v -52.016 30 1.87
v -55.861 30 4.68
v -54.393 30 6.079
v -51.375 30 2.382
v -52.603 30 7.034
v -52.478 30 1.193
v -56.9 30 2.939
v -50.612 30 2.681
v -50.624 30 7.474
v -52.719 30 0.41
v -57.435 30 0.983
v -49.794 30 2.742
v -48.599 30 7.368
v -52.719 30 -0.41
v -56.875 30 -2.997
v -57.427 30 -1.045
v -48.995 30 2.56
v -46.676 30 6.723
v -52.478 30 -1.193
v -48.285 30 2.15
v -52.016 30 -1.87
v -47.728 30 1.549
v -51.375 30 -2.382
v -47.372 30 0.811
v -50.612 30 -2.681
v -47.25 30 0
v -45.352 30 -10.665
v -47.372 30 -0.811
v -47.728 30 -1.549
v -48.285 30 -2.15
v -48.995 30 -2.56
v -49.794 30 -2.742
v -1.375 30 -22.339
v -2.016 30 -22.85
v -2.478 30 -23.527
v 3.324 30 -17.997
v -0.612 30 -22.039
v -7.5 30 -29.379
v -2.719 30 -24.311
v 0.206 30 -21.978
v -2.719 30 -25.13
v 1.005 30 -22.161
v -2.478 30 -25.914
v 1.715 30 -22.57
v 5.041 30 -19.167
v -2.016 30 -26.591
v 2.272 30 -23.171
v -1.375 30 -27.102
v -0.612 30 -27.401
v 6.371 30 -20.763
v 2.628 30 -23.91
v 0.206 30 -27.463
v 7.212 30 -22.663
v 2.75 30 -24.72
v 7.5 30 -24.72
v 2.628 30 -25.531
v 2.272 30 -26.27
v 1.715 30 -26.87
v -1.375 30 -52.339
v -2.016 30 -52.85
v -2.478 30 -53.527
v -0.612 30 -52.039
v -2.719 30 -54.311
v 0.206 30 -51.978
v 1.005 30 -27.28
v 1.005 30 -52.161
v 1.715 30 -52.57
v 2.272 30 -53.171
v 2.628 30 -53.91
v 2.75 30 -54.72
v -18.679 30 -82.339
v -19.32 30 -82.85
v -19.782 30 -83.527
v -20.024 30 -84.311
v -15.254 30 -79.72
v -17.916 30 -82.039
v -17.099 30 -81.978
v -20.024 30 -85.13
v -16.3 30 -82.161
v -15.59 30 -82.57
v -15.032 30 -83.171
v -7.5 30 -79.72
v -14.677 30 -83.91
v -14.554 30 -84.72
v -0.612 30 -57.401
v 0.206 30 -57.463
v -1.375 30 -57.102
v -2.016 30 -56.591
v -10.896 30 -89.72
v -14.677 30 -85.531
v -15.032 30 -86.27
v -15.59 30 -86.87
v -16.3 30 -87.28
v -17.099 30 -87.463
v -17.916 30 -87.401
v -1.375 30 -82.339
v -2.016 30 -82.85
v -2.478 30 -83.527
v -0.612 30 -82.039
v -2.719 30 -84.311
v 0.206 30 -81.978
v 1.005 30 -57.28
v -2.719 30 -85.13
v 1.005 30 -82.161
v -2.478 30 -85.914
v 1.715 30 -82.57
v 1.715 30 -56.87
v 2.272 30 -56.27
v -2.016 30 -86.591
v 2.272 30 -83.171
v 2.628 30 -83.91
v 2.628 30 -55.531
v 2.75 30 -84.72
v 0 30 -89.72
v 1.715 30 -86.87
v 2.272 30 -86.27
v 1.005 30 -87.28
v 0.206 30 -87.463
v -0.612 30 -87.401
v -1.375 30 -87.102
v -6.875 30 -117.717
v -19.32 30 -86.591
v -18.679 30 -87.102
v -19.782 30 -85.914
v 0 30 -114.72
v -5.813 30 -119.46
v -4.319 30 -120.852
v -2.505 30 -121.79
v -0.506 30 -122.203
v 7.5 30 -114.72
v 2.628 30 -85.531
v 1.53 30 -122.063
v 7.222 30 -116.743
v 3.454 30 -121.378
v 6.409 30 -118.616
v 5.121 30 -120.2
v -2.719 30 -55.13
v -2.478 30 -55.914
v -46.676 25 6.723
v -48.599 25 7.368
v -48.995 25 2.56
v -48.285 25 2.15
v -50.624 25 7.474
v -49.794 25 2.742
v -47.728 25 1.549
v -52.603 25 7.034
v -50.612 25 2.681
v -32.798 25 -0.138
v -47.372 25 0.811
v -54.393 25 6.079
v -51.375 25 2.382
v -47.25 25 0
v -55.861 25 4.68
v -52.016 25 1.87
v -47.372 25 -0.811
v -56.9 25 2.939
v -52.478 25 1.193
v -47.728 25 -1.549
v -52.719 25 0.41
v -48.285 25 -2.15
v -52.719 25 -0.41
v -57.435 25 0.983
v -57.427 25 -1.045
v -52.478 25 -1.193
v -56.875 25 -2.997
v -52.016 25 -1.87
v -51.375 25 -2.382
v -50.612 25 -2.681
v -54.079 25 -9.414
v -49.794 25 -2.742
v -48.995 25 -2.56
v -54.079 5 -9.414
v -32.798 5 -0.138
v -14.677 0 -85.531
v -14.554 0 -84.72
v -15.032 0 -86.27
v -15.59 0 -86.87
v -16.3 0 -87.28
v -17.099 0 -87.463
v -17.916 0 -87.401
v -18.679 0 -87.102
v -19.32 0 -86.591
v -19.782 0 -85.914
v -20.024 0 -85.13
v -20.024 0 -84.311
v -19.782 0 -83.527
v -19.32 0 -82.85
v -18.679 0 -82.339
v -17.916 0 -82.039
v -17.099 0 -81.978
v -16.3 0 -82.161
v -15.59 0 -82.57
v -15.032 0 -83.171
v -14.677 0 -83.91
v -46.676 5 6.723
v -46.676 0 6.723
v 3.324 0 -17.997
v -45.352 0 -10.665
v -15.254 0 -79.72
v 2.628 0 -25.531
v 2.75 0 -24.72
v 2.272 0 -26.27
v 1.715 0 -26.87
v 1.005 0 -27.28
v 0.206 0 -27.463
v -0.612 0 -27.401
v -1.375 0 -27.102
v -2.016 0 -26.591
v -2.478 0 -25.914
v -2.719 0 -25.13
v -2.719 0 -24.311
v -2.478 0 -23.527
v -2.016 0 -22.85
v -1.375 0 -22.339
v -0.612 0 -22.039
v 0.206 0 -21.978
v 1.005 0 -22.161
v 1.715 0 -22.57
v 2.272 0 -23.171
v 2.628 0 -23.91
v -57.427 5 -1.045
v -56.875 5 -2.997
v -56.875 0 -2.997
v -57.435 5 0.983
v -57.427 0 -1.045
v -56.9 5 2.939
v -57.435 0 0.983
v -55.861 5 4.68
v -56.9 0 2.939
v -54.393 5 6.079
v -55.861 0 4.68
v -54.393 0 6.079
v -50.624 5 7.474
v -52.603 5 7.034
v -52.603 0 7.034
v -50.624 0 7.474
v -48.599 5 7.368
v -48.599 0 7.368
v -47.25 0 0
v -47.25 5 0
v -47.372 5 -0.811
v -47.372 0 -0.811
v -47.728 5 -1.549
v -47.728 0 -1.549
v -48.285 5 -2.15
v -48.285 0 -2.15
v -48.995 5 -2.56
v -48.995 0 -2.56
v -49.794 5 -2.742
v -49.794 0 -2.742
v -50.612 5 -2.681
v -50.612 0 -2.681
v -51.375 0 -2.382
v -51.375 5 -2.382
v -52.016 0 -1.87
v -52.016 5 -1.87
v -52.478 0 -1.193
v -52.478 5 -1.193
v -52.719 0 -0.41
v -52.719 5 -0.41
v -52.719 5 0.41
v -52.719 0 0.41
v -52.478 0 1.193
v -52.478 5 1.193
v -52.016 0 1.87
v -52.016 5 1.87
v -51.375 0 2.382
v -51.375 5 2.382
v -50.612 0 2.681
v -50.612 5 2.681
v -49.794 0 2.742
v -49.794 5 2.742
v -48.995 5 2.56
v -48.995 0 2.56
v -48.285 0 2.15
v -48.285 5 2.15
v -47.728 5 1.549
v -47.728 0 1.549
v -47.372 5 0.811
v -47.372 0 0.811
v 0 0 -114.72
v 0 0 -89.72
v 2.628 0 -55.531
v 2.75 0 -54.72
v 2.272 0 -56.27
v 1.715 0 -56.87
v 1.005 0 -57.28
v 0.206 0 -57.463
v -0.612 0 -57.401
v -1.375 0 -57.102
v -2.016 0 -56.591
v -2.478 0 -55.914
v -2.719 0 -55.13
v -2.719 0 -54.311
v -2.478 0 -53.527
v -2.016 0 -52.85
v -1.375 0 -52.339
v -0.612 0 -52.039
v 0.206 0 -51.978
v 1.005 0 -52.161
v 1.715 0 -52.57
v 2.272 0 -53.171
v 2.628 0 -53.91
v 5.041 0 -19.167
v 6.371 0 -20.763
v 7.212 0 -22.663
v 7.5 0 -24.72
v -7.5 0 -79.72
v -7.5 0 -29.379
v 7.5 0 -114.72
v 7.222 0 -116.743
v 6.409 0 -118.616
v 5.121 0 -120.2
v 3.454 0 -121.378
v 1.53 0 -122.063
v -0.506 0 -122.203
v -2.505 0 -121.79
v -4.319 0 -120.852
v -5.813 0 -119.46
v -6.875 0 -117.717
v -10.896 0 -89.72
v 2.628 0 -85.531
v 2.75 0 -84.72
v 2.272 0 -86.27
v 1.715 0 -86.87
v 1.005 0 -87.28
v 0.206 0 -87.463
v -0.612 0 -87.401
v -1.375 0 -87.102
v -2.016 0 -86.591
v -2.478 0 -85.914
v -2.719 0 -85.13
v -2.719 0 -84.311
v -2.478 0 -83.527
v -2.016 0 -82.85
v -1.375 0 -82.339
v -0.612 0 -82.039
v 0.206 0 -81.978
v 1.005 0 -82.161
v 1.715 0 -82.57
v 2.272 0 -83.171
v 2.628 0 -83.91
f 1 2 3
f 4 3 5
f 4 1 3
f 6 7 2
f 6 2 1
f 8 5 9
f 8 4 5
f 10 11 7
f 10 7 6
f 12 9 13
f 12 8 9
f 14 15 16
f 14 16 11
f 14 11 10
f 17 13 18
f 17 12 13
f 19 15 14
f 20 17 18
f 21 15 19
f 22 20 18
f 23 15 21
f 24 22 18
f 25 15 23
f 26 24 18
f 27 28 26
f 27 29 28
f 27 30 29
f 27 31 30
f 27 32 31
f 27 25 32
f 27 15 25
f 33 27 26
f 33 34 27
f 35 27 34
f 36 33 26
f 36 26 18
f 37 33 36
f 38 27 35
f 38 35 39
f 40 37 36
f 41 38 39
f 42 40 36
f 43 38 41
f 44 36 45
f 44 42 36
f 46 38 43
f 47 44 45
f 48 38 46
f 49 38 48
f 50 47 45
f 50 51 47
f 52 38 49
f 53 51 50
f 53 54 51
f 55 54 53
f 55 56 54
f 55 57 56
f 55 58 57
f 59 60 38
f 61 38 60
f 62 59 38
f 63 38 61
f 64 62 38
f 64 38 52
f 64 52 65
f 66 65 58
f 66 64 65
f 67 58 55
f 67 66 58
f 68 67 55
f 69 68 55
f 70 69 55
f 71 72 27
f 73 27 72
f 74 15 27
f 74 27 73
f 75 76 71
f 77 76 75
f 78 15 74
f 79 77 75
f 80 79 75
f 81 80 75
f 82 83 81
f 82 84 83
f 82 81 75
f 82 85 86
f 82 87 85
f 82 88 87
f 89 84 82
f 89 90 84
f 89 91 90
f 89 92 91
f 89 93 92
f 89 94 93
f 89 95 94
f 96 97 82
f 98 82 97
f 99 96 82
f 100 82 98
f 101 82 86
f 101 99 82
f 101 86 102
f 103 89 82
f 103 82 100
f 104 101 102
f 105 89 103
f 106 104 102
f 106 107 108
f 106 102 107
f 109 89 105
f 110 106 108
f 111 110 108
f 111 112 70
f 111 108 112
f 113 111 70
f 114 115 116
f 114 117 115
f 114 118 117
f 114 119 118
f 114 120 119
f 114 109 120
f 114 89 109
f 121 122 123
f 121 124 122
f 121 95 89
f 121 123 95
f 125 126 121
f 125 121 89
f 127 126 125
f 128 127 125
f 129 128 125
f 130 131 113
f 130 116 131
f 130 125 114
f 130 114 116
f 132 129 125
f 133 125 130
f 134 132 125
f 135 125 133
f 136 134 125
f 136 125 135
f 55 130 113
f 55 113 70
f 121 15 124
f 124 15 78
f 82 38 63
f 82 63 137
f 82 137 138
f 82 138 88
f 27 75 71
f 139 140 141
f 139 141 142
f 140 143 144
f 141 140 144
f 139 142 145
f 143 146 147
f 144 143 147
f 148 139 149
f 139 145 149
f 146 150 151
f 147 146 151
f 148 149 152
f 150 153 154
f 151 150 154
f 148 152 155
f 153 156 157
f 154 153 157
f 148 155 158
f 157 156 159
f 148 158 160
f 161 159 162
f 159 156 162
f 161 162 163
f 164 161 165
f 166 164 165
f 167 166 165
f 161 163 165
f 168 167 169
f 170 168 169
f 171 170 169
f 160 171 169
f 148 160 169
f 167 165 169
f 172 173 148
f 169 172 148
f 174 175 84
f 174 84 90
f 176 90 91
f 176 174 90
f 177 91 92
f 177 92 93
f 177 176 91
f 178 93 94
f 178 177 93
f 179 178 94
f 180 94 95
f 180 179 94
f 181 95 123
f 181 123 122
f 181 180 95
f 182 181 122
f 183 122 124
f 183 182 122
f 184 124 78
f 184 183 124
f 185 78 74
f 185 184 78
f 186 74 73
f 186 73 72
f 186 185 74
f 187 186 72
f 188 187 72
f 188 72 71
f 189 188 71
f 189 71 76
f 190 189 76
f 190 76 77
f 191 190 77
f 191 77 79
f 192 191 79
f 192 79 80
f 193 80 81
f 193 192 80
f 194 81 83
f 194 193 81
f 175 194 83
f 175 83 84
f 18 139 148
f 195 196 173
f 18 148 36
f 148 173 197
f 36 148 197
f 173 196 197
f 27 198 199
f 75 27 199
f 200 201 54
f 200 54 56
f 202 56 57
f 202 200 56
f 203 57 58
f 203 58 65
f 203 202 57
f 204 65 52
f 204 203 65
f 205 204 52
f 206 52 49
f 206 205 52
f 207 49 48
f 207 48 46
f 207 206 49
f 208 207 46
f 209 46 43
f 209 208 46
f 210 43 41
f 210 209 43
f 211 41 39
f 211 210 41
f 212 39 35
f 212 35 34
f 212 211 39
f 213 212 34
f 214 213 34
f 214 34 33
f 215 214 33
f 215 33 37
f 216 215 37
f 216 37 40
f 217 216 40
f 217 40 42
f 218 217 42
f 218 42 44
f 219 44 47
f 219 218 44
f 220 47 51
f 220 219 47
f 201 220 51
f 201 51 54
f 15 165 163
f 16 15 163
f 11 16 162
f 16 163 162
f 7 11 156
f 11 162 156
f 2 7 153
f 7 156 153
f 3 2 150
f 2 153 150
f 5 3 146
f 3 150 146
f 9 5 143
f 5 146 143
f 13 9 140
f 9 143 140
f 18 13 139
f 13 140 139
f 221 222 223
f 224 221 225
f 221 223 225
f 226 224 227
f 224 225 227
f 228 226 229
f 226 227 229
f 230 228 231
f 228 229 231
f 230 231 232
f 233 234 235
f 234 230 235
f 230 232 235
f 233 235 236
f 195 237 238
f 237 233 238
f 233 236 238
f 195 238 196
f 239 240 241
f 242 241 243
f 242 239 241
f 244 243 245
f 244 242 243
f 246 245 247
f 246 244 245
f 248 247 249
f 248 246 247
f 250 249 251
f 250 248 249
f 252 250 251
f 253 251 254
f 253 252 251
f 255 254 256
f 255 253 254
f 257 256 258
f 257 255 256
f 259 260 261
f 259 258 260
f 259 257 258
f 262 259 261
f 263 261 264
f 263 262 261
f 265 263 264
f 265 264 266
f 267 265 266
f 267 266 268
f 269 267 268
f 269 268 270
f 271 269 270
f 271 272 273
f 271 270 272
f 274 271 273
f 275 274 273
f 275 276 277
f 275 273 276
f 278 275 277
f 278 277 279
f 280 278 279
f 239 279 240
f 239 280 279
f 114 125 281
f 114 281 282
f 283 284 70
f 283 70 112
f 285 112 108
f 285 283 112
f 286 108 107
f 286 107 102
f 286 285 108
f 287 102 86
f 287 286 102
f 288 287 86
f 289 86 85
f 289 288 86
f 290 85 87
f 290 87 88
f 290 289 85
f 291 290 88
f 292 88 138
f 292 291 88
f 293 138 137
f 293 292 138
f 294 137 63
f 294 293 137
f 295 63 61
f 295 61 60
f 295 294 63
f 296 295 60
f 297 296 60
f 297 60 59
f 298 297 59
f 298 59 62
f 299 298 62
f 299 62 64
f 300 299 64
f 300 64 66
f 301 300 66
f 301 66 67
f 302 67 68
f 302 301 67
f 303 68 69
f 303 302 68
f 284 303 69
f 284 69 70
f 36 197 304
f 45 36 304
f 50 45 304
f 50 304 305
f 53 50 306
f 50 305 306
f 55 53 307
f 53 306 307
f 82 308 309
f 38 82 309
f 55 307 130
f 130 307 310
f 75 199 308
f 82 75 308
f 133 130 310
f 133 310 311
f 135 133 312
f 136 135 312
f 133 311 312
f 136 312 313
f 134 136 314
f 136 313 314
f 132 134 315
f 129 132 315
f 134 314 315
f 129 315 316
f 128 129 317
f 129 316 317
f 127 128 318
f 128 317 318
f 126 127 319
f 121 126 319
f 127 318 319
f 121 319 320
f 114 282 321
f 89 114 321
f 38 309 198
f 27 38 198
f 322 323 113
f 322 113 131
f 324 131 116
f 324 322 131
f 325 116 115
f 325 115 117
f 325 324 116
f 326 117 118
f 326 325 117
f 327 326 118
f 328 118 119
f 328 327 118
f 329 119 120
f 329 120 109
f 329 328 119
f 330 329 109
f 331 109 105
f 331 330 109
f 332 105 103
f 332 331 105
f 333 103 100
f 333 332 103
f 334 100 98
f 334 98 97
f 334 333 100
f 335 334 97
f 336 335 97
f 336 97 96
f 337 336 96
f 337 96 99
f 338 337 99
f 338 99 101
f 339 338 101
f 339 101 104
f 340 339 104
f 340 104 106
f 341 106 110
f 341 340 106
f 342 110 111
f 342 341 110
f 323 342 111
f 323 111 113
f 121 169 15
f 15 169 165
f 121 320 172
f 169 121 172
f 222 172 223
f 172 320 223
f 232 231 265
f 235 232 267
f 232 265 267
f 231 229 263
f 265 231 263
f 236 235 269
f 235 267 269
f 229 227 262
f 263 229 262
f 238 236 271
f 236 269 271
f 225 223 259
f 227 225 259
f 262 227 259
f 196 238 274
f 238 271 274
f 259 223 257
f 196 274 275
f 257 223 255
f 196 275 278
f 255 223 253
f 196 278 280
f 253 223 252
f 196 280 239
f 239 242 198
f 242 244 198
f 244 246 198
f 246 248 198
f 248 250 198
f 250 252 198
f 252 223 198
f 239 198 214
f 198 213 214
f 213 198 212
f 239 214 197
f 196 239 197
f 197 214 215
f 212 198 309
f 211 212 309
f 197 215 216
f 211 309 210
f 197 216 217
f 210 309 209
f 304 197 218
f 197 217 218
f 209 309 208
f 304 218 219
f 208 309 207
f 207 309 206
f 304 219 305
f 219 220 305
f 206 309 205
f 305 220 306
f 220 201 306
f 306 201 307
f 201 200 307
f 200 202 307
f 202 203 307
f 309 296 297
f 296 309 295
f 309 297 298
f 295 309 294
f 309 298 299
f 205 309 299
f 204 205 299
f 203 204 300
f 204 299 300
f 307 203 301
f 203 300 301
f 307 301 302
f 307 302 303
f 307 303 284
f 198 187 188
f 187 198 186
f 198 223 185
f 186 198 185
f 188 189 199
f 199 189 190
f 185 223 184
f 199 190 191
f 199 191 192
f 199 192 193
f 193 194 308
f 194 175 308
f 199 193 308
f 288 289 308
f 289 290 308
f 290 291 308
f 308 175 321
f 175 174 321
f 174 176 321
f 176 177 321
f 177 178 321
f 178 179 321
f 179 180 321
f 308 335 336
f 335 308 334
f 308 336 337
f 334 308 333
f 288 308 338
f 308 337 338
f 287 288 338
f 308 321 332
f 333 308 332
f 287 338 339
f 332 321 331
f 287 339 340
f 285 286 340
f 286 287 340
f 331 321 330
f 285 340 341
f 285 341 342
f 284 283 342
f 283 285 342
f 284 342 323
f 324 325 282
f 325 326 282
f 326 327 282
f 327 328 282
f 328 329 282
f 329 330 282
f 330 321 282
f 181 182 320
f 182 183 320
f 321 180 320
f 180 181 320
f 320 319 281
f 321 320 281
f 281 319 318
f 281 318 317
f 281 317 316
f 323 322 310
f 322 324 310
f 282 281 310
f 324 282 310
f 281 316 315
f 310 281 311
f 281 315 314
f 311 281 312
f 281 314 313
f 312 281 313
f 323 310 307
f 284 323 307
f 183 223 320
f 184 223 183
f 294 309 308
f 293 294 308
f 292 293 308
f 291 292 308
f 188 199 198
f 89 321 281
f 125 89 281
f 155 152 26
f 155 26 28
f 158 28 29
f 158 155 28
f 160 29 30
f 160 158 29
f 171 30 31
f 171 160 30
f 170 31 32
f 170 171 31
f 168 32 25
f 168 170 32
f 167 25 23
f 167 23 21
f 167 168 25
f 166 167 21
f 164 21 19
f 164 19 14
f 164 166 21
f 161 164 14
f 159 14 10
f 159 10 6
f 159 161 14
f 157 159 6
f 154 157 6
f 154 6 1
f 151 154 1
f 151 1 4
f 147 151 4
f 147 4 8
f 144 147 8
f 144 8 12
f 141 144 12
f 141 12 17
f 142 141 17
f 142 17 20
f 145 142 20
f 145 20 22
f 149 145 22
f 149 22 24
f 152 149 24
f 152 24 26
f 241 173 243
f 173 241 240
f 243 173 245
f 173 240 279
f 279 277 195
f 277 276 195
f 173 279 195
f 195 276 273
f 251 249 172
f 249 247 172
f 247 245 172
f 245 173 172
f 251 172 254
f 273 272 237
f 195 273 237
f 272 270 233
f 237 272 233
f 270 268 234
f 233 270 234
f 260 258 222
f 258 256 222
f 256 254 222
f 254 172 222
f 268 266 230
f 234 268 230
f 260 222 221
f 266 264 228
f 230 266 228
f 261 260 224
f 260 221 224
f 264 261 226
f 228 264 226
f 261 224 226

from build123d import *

# Parameters (mm, degrees)
SKETCH1_R           = 2.75
BOSS_EXTRUDE1_DEPTH = 30
SKETCH4_W           = 7
SKETCH4_H           = 20
SKETCH4_W_2         = 13.969977059
CUT_EXTRUDE2_DEPTH  = 34


with BuildPart() as part:
    # Sketch1 → Boss-Extrude1 (new body)
    with BuildSketch(Plane(origin=(0, 0, 0), x_dir=(1, 0, 0), z_dir=(0, 1, 0))):
        with BuildLine():
            Line((-46.676005757, -6.723173527), (3.323994243, 17.99725225))
            ThreePointArc((3.323994243, 17.99725225), (6.37102648, 20.763151262), (7.5, 24.720425777))
            Line((7.5, 24.720425777), (7.5, 114.720425777))
            ThreePointArc((7.5, 114.720425777), (1.53049147, 122.062605008), (-6.875358896, 117.716997159))
            Line((-6.875358896, 117.716997159), (-56.875358896, 2.996571382))
            ThreePointArc((-56.875358896, 2.996571382), (-55.174109392, -5.429419122), (-46.676005757, -6.723173527))
        make_face()
        with Locations((-50, 0)):
            Circle(SKETCH1_R, mode=Mode.SUBTRACT)
        Polygon((-7.5, 29.378946496), (-45.351897452, 10.664646067), (-15.254476159, 79.720425777), (-7.5, 79.720425777), align=None, mode=Mode.SUBTRACT)
        with Locations((0, 54.720425777)):
            Circle(SKETCH1_R, mode=Mode.SUBTRACT)
        with Locations((-17.304325397, 84.720425777)):
            Circle(SKETCH1_R, mode=Mode.SUBTRACT)
        with Locations((0, 84.720425777)):
            Circle(SKETCH1_R, mode=Mode.SUBTRACT)
        Polygon((-10.8960544, 89.720425777), (0, 114.720425777), (0, 89.720425777), align=None, mode=Mode.SUBTRACT)
        with Locations((0, 24.720425777)):
            Circle(SKETCH1_R, mode=Mode.SUBTRACT)
    extrude(amount=BOSS_EXTRUDE1_DEPTH)

    # Sketch4 → Cut-Extrude2 (cut)
    with BuildSketch(Plane(origin=(-48.89363441, 0, -21.309908013), x_dir=(-0.399542851, 0, 0.91671452), z_dir=(-0.91671452, 0, -0.399542851))):
        with Locations((16.477142547, 15)):
            Rectangle(SKETCH4_W, SKETCH4_H)
        with Locations((26.962131077, 15)):
            Rectangle(SKETCH4_W_2, SKETCH4_H)
    extrude(amount=-CUT_EXTRUDE2_DEPTH, mode=Mode.SUBTRACT)


solid = part.part
